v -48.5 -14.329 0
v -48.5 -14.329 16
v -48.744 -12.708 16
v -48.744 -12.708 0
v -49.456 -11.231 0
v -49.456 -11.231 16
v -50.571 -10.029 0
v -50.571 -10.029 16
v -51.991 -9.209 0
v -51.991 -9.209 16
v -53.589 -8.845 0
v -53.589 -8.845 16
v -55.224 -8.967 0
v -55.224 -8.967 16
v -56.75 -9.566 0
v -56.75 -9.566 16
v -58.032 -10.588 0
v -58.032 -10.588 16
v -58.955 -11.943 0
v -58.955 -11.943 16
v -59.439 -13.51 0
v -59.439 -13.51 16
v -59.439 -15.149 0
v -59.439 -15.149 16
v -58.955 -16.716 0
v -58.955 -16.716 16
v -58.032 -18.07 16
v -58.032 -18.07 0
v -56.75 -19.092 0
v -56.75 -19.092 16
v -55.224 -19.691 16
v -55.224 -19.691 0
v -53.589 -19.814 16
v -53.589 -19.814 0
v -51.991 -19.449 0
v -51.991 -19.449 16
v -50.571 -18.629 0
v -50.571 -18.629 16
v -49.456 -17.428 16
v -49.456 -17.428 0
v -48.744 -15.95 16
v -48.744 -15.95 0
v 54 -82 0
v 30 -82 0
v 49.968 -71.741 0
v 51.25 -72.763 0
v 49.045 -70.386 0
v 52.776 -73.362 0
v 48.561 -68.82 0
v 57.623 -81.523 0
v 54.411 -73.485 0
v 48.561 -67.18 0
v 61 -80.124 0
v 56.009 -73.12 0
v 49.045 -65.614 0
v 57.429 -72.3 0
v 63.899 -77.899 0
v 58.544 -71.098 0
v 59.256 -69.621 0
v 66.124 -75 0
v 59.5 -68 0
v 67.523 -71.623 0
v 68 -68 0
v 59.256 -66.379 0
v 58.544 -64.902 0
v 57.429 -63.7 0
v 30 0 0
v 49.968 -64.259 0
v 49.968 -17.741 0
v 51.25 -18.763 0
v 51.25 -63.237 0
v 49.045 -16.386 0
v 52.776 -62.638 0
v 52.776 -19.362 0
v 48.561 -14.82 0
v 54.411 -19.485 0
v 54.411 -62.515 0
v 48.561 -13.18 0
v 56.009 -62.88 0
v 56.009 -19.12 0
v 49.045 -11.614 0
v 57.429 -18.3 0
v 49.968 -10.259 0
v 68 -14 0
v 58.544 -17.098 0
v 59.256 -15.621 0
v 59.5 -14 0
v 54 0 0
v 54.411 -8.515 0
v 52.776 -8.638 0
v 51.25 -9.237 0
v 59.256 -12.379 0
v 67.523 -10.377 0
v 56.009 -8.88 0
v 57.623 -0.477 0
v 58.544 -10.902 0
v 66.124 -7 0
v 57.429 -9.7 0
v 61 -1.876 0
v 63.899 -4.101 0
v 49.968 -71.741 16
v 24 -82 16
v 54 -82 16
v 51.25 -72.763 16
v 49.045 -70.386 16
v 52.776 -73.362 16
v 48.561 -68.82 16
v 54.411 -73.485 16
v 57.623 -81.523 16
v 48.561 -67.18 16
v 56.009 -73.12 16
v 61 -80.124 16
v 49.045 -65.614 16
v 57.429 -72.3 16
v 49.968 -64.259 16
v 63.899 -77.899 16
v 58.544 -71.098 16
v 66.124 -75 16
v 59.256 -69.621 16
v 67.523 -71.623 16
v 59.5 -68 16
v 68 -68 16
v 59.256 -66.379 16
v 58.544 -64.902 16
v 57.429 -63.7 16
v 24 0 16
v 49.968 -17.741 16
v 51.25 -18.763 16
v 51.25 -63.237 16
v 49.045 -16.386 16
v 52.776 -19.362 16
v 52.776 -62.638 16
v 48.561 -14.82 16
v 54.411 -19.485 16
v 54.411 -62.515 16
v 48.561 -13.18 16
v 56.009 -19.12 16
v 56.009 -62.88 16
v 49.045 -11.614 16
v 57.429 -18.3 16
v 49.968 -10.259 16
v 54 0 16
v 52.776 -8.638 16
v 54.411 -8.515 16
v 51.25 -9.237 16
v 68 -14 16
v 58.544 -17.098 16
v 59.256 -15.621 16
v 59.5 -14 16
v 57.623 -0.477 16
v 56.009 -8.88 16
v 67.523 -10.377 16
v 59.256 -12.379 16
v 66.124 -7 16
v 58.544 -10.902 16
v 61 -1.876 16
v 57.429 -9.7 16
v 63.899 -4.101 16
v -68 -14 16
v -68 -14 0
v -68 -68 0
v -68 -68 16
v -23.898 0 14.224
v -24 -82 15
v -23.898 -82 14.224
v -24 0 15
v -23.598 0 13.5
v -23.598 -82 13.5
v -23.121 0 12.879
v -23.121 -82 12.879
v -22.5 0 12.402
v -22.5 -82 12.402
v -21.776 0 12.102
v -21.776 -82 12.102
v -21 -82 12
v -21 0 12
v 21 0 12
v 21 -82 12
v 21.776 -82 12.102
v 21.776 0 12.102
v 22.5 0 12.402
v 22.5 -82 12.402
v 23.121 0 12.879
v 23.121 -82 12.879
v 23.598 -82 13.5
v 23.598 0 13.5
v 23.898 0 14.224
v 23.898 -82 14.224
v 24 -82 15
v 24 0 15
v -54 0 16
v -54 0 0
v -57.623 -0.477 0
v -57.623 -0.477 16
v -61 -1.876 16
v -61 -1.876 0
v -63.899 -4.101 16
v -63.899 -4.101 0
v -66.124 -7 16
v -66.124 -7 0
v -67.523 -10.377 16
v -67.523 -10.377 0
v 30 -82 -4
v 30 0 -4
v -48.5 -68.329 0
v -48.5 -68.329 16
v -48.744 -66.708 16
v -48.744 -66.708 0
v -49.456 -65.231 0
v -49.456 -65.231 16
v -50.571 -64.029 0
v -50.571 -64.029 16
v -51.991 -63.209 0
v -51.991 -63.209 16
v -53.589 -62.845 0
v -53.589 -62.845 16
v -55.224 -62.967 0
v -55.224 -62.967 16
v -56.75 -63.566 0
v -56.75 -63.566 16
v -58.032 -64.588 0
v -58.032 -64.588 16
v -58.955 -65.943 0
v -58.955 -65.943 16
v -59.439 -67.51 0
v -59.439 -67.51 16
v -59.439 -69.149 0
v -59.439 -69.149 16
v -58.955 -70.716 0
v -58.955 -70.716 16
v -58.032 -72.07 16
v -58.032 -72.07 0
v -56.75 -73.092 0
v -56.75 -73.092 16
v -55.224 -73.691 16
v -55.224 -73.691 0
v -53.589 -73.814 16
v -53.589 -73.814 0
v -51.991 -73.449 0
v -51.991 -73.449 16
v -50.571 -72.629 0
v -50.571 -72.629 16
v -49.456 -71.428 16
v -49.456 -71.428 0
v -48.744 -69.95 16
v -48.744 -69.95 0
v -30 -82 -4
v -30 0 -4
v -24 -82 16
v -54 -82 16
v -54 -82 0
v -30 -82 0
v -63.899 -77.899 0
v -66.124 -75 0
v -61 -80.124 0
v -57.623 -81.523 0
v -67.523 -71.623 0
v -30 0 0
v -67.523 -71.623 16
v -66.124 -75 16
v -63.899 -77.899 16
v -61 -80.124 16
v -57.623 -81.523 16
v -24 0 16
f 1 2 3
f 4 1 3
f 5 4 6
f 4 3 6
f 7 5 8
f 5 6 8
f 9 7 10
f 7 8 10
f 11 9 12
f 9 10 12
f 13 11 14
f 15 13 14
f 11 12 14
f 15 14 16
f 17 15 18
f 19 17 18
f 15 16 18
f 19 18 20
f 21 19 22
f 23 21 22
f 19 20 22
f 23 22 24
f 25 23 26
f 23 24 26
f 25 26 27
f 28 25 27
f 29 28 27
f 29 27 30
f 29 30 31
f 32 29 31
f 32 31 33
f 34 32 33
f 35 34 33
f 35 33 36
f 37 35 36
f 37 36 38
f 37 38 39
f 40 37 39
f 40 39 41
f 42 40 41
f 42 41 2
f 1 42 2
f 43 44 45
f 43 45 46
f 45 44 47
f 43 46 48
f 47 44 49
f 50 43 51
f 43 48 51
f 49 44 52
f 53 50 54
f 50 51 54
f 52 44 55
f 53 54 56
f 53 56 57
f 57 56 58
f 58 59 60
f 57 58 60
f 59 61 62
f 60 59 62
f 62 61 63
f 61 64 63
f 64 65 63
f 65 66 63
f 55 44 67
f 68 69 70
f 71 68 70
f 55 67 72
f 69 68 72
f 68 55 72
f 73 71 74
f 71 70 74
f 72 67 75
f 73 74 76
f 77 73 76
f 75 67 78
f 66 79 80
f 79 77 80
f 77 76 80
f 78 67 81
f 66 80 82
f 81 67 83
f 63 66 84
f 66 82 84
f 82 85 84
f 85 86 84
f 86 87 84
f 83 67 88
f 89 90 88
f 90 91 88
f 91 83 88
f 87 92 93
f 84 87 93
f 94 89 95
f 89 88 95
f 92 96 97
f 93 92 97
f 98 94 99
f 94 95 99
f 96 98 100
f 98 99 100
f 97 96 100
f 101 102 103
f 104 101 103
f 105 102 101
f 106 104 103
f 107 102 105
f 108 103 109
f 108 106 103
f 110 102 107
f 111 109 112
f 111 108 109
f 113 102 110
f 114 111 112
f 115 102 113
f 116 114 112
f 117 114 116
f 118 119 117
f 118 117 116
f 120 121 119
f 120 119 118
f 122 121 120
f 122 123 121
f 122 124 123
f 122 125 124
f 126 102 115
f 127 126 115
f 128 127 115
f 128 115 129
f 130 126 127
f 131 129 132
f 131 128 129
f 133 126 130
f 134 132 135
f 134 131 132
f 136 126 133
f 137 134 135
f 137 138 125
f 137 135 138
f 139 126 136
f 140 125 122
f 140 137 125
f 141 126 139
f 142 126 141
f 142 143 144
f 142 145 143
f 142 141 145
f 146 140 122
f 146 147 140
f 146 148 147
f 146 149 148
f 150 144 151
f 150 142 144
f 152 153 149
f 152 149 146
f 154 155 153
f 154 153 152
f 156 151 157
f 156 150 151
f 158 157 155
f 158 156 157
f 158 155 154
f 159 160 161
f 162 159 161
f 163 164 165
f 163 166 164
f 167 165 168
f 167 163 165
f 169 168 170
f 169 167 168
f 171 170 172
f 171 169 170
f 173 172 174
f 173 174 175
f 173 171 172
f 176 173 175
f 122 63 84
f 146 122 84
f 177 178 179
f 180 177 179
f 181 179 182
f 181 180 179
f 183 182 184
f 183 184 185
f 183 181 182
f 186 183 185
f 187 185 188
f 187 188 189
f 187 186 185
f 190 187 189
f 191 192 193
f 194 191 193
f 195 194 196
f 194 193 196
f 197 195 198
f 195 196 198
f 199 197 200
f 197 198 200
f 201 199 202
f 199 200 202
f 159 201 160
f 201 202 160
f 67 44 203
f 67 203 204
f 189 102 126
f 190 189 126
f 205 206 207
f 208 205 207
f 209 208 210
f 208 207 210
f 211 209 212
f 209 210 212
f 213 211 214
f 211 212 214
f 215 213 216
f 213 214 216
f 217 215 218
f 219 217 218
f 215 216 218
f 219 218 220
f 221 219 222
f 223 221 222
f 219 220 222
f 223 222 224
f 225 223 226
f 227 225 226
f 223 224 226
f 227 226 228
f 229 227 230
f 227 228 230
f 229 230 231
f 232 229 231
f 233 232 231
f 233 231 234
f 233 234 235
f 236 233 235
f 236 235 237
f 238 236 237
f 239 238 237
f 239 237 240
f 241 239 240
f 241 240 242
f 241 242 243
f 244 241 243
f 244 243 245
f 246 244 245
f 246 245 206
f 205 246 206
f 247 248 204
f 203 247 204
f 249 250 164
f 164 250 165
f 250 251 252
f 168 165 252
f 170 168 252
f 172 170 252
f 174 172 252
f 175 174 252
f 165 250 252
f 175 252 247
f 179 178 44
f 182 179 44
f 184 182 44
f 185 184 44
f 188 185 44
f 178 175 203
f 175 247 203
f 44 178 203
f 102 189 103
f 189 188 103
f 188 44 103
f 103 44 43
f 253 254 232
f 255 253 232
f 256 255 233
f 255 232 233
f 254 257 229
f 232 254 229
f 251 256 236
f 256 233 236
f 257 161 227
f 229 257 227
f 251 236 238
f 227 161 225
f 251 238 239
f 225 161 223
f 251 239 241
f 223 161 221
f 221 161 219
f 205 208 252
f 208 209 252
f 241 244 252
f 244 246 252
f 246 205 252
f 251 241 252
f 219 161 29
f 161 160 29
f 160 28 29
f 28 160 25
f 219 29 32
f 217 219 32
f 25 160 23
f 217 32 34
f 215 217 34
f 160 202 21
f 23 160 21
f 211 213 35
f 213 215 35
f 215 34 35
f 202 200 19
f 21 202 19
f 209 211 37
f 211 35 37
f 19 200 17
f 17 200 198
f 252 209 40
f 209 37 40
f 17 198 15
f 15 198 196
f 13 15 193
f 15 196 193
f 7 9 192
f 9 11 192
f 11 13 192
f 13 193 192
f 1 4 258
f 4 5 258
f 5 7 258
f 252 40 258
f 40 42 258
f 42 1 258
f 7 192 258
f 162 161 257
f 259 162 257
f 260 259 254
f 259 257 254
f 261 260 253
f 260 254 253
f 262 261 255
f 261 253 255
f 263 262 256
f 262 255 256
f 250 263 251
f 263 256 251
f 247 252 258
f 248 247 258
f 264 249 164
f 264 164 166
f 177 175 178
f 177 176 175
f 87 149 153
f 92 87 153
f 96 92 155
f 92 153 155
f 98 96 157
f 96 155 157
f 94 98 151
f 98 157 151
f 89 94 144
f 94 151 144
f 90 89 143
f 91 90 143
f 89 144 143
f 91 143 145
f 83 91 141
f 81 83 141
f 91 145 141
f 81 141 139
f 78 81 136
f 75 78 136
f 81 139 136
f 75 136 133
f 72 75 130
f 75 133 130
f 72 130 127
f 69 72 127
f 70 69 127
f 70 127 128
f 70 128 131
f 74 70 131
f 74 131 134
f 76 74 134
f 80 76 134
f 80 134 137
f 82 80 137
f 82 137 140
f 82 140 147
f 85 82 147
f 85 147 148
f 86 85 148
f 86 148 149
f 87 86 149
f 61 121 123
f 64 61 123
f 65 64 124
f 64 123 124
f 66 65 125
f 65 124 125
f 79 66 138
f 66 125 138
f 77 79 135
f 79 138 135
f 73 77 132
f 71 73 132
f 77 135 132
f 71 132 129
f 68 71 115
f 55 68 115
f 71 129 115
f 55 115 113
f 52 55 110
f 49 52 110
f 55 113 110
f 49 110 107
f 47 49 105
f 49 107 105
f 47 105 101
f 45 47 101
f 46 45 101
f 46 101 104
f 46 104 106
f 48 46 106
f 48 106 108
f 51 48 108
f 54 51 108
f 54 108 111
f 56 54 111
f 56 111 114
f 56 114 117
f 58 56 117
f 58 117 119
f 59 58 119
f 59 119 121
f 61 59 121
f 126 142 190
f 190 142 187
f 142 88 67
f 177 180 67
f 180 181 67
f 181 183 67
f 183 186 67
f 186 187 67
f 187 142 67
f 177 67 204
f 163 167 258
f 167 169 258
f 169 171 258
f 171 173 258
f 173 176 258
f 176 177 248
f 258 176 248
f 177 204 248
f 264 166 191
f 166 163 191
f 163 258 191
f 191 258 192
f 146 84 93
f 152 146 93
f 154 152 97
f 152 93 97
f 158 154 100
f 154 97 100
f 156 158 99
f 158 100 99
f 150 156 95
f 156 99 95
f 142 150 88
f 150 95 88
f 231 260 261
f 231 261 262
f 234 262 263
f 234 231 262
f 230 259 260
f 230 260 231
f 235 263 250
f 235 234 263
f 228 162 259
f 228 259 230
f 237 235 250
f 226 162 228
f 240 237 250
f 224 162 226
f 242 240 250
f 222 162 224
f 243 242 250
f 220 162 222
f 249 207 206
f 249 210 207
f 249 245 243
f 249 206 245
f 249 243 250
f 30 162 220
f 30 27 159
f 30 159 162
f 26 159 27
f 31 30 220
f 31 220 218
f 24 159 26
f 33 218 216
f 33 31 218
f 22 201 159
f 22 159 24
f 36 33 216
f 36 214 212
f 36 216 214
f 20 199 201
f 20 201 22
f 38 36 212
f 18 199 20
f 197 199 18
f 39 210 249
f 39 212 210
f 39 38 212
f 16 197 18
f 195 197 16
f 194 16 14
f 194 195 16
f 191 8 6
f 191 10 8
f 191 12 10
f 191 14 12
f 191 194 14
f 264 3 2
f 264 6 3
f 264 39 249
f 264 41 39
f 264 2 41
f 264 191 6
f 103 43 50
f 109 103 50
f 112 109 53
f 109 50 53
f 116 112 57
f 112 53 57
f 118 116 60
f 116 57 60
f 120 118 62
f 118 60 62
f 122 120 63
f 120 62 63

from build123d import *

# Parameters (mm, degrees)
F1_DEPTH = 16
F2_W     = 60
F2_H     = 82
F3_DEPTH = 4
F4_W     = 48
F4_H     = 82
F5_DEPTH = 4
F6_R     = 3
F7_R     = 5.5
F8_DEPTH = 20.001


with BuildPart() as f1:
    # F0 (on Top) → F1 (new body)
    with BuildSketch(Plane.XY):
        with BuildLine():
            ThreePointArc((-54, 0), (-63.899495, -4.100505), (-68, -14))
            Line((-68, -14), (-68, -68))
            ThreePointArc((-68, -68), (-63.899495, -77.899495), (-54, -82))
            Line((-54, -82), (54, -82))
            ThreePointArc((54, -82), (63.899495, -77.899495), (68, -68))
            Line((68, -68), (68, -14))
            ThreePointArc((68, -14), (63.899495, -4.100505), (54, 0))
            Line((54, 0), (-54, 0))
        make_face()
    extrude(amount=F1_DEPTH)

    # F2 (on Top) → F3 (join)
    with BuildSketch(Plane.XY):
        with Locations((0, -41)):
            Rectangle(F2_W, F2_H)
    extrude(amount=-F3_DEPTH)

    # F4 (on face) → F5 (cut)
    with BuildSketch(Plane.XY.offset(16)):
        with Locations((0, -41)):
            Rectangle(F4_W, F4_H)
    extrude(amount=-F5_DEPTH, mode=Mode.SUBTRACT)

    # F6
    f6_edges = [f1.edges().sort_by_distance(p)[0] for p in [
        (-24, -41, 12),
        (24, -41, 12),
    ]]
    fillet(f6_edges, radius=F6_R)

    # F7 (on face) → F8 (cut, through all)
    with BuildSketch(Plane.XY.offset(16)):
        with Locations((54, -14)):
            Circle(F7_R)
        with Locations((54, -68)):
            Circle(F7_R)
        with Locations((-54, -14.32929)):
            Circle(F7_R)
        with Locations((-54, -68.32929)):
            Circle(F7_R)
    extrude(amount=-F8_DEPTH, mode=Mode.SUBTRACT)


solid = f1.part
